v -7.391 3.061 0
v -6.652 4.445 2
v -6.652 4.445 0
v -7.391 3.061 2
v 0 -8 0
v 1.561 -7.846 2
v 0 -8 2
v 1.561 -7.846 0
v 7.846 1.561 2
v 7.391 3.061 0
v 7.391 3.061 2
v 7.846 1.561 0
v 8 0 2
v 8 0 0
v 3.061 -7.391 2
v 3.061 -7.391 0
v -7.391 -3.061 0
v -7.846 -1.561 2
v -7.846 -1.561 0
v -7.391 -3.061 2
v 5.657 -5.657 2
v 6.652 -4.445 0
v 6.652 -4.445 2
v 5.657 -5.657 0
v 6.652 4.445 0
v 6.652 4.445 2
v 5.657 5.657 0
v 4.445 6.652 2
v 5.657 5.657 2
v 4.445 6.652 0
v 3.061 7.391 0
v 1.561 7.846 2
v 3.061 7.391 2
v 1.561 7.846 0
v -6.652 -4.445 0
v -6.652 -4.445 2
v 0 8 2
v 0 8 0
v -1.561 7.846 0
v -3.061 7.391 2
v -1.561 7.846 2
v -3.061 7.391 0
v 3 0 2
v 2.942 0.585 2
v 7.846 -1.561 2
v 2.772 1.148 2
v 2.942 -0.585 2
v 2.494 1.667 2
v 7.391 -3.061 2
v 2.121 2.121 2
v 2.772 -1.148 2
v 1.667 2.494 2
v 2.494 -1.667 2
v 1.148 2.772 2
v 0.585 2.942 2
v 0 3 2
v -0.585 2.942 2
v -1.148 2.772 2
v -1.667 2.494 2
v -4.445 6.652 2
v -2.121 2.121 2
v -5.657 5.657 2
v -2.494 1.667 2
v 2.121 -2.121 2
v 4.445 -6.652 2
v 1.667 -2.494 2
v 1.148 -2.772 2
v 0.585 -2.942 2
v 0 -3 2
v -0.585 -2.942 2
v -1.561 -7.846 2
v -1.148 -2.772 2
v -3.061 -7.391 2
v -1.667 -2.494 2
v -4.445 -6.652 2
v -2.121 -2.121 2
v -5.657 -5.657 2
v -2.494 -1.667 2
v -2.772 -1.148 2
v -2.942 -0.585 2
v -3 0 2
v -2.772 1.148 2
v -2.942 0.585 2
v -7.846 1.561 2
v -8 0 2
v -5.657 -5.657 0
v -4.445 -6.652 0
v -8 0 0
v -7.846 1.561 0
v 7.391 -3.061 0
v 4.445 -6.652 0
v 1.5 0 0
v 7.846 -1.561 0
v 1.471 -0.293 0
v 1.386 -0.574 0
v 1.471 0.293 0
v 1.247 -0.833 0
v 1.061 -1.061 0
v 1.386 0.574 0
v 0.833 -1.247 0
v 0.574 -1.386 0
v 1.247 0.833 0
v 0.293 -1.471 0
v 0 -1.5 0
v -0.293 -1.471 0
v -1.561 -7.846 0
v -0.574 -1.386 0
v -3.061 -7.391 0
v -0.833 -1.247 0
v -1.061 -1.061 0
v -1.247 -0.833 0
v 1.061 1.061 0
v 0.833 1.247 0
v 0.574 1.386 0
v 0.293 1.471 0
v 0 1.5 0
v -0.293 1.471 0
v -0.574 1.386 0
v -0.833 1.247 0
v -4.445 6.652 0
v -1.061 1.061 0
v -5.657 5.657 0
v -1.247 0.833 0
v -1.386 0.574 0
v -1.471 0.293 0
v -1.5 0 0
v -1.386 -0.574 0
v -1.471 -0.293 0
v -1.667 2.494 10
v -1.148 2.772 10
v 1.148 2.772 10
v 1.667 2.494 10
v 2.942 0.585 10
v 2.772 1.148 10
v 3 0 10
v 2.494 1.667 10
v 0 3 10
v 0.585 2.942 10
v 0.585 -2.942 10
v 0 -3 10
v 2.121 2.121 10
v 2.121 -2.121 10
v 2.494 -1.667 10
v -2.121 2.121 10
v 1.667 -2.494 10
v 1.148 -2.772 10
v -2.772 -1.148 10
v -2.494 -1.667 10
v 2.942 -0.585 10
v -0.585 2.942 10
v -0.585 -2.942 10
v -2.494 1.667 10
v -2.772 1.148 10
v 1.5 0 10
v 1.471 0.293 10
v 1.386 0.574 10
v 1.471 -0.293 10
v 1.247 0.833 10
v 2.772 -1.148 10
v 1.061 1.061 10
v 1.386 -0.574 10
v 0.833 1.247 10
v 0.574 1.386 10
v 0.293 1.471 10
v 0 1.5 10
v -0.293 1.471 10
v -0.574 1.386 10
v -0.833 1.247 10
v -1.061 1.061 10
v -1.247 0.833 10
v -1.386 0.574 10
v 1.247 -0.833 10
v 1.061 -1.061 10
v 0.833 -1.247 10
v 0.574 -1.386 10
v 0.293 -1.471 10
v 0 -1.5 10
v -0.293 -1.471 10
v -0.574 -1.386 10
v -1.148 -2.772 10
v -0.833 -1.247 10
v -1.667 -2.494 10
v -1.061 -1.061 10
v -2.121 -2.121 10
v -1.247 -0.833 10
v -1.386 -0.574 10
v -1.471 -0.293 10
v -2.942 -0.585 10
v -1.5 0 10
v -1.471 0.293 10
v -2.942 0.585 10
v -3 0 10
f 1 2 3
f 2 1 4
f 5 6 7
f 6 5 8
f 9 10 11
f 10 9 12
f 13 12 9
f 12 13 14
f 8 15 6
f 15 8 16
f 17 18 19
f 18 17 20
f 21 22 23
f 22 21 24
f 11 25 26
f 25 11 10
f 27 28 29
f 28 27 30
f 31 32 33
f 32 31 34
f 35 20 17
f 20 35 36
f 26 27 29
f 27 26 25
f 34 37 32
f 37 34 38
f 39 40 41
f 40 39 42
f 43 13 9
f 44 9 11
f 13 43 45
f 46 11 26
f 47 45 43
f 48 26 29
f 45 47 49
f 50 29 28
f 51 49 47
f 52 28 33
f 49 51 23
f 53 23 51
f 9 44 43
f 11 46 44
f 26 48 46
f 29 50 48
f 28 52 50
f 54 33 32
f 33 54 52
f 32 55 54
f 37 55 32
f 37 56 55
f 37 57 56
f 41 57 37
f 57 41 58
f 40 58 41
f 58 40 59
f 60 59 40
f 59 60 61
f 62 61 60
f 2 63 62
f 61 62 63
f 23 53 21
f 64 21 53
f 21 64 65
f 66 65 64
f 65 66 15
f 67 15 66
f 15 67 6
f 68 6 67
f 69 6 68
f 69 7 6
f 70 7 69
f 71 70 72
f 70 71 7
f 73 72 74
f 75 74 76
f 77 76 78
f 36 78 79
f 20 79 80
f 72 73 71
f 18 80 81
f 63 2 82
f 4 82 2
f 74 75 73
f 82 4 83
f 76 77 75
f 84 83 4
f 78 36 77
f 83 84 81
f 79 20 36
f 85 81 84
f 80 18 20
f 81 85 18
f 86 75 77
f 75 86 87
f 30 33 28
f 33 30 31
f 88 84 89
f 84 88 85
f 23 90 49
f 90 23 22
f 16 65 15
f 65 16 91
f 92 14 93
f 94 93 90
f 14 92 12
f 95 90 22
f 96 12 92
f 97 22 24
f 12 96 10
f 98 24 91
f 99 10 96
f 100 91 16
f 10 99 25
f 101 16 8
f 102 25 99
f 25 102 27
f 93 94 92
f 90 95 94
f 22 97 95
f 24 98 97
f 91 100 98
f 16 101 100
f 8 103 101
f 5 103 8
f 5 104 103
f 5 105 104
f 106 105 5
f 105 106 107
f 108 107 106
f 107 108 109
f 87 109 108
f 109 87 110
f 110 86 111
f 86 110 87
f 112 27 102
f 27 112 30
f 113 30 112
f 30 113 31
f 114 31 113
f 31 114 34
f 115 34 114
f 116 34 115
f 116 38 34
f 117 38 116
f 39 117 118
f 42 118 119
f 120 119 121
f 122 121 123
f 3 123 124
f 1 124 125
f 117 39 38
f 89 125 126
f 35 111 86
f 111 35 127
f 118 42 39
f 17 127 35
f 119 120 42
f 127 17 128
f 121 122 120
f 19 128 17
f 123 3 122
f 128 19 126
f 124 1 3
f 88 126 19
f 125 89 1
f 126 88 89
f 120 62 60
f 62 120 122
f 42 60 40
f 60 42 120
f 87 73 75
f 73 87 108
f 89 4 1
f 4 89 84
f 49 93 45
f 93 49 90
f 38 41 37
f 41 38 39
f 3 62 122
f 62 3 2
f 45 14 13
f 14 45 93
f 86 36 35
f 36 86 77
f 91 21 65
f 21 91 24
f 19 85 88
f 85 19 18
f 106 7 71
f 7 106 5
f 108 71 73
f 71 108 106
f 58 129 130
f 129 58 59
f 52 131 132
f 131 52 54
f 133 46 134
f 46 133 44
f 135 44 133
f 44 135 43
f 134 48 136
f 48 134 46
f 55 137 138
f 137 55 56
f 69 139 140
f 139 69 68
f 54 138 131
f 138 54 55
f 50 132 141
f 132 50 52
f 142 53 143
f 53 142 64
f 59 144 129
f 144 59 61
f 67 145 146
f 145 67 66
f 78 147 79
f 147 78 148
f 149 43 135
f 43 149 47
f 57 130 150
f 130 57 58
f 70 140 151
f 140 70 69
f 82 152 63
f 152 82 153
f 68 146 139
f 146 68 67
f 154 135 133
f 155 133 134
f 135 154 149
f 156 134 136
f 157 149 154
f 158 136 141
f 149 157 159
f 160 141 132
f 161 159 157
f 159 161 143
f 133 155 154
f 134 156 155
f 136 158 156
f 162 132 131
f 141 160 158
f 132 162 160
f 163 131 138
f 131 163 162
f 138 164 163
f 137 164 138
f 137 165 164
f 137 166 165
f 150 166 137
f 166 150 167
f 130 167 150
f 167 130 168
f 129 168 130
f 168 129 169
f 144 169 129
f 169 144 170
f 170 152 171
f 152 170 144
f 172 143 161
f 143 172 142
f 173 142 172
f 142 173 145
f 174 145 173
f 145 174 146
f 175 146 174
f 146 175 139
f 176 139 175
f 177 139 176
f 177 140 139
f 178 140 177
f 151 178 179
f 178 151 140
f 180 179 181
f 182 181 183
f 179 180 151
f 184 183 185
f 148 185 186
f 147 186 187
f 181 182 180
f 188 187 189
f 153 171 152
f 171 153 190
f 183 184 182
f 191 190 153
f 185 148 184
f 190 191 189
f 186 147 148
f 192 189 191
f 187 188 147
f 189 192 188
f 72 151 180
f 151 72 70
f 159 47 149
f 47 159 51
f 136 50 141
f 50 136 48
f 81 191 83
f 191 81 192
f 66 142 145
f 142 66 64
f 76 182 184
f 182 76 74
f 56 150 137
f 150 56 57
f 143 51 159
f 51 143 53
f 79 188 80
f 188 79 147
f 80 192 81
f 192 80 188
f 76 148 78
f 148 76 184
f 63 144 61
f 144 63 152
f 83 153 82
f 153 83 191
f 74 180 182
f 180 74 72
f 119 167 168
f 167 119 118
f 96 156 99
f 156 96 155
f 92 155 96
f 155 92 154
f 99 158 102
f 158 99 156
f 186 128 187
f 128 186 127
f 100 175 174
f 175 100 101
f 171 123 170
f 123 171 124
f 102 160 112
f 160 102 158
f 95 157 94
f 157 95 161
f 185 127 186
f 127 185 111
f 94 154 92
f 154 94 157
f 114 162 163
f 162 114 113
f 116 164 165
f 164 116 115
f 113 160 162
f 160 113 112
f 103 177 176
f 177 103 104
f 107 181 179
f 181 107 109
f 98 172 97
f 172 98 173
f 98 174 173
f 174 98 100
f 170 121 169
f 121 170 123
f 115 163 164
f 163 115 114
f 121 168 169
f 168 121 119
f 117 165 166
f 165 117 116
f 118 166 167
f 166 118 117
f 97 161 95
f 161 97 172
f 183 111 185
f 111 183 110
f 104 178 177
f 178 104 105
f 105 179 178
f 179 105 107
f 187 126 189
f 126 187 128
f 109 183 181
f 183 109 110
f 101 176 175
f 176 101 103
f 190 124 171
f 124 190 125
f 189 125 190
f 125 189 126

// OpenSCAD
$fn = 32;

// ----------------------------------------------------------------------
// Micro post: flanged post, 5-20 mm class
// ----------------------------------------------------------------------

// --- parameters (mm) ---
post_d = 6;               // post diameter
post_h = 8;               // post height above the flange
flange_d = 16;            // flange diameter
flange_t = 2;             // flange thickness
bore_d = 3;               // through bore

total_h = post_h + flange_t;  // overall height

difference() {
  union() {
    cylinder(h = flange_t, d = flange_d);
    translate([0, 0, flange_t]) cylinder(h = post_h, d = post_d);
  }
  translate([0, 0, -1]) cylinder(h = total_h + 2, d = bore_d);
}
